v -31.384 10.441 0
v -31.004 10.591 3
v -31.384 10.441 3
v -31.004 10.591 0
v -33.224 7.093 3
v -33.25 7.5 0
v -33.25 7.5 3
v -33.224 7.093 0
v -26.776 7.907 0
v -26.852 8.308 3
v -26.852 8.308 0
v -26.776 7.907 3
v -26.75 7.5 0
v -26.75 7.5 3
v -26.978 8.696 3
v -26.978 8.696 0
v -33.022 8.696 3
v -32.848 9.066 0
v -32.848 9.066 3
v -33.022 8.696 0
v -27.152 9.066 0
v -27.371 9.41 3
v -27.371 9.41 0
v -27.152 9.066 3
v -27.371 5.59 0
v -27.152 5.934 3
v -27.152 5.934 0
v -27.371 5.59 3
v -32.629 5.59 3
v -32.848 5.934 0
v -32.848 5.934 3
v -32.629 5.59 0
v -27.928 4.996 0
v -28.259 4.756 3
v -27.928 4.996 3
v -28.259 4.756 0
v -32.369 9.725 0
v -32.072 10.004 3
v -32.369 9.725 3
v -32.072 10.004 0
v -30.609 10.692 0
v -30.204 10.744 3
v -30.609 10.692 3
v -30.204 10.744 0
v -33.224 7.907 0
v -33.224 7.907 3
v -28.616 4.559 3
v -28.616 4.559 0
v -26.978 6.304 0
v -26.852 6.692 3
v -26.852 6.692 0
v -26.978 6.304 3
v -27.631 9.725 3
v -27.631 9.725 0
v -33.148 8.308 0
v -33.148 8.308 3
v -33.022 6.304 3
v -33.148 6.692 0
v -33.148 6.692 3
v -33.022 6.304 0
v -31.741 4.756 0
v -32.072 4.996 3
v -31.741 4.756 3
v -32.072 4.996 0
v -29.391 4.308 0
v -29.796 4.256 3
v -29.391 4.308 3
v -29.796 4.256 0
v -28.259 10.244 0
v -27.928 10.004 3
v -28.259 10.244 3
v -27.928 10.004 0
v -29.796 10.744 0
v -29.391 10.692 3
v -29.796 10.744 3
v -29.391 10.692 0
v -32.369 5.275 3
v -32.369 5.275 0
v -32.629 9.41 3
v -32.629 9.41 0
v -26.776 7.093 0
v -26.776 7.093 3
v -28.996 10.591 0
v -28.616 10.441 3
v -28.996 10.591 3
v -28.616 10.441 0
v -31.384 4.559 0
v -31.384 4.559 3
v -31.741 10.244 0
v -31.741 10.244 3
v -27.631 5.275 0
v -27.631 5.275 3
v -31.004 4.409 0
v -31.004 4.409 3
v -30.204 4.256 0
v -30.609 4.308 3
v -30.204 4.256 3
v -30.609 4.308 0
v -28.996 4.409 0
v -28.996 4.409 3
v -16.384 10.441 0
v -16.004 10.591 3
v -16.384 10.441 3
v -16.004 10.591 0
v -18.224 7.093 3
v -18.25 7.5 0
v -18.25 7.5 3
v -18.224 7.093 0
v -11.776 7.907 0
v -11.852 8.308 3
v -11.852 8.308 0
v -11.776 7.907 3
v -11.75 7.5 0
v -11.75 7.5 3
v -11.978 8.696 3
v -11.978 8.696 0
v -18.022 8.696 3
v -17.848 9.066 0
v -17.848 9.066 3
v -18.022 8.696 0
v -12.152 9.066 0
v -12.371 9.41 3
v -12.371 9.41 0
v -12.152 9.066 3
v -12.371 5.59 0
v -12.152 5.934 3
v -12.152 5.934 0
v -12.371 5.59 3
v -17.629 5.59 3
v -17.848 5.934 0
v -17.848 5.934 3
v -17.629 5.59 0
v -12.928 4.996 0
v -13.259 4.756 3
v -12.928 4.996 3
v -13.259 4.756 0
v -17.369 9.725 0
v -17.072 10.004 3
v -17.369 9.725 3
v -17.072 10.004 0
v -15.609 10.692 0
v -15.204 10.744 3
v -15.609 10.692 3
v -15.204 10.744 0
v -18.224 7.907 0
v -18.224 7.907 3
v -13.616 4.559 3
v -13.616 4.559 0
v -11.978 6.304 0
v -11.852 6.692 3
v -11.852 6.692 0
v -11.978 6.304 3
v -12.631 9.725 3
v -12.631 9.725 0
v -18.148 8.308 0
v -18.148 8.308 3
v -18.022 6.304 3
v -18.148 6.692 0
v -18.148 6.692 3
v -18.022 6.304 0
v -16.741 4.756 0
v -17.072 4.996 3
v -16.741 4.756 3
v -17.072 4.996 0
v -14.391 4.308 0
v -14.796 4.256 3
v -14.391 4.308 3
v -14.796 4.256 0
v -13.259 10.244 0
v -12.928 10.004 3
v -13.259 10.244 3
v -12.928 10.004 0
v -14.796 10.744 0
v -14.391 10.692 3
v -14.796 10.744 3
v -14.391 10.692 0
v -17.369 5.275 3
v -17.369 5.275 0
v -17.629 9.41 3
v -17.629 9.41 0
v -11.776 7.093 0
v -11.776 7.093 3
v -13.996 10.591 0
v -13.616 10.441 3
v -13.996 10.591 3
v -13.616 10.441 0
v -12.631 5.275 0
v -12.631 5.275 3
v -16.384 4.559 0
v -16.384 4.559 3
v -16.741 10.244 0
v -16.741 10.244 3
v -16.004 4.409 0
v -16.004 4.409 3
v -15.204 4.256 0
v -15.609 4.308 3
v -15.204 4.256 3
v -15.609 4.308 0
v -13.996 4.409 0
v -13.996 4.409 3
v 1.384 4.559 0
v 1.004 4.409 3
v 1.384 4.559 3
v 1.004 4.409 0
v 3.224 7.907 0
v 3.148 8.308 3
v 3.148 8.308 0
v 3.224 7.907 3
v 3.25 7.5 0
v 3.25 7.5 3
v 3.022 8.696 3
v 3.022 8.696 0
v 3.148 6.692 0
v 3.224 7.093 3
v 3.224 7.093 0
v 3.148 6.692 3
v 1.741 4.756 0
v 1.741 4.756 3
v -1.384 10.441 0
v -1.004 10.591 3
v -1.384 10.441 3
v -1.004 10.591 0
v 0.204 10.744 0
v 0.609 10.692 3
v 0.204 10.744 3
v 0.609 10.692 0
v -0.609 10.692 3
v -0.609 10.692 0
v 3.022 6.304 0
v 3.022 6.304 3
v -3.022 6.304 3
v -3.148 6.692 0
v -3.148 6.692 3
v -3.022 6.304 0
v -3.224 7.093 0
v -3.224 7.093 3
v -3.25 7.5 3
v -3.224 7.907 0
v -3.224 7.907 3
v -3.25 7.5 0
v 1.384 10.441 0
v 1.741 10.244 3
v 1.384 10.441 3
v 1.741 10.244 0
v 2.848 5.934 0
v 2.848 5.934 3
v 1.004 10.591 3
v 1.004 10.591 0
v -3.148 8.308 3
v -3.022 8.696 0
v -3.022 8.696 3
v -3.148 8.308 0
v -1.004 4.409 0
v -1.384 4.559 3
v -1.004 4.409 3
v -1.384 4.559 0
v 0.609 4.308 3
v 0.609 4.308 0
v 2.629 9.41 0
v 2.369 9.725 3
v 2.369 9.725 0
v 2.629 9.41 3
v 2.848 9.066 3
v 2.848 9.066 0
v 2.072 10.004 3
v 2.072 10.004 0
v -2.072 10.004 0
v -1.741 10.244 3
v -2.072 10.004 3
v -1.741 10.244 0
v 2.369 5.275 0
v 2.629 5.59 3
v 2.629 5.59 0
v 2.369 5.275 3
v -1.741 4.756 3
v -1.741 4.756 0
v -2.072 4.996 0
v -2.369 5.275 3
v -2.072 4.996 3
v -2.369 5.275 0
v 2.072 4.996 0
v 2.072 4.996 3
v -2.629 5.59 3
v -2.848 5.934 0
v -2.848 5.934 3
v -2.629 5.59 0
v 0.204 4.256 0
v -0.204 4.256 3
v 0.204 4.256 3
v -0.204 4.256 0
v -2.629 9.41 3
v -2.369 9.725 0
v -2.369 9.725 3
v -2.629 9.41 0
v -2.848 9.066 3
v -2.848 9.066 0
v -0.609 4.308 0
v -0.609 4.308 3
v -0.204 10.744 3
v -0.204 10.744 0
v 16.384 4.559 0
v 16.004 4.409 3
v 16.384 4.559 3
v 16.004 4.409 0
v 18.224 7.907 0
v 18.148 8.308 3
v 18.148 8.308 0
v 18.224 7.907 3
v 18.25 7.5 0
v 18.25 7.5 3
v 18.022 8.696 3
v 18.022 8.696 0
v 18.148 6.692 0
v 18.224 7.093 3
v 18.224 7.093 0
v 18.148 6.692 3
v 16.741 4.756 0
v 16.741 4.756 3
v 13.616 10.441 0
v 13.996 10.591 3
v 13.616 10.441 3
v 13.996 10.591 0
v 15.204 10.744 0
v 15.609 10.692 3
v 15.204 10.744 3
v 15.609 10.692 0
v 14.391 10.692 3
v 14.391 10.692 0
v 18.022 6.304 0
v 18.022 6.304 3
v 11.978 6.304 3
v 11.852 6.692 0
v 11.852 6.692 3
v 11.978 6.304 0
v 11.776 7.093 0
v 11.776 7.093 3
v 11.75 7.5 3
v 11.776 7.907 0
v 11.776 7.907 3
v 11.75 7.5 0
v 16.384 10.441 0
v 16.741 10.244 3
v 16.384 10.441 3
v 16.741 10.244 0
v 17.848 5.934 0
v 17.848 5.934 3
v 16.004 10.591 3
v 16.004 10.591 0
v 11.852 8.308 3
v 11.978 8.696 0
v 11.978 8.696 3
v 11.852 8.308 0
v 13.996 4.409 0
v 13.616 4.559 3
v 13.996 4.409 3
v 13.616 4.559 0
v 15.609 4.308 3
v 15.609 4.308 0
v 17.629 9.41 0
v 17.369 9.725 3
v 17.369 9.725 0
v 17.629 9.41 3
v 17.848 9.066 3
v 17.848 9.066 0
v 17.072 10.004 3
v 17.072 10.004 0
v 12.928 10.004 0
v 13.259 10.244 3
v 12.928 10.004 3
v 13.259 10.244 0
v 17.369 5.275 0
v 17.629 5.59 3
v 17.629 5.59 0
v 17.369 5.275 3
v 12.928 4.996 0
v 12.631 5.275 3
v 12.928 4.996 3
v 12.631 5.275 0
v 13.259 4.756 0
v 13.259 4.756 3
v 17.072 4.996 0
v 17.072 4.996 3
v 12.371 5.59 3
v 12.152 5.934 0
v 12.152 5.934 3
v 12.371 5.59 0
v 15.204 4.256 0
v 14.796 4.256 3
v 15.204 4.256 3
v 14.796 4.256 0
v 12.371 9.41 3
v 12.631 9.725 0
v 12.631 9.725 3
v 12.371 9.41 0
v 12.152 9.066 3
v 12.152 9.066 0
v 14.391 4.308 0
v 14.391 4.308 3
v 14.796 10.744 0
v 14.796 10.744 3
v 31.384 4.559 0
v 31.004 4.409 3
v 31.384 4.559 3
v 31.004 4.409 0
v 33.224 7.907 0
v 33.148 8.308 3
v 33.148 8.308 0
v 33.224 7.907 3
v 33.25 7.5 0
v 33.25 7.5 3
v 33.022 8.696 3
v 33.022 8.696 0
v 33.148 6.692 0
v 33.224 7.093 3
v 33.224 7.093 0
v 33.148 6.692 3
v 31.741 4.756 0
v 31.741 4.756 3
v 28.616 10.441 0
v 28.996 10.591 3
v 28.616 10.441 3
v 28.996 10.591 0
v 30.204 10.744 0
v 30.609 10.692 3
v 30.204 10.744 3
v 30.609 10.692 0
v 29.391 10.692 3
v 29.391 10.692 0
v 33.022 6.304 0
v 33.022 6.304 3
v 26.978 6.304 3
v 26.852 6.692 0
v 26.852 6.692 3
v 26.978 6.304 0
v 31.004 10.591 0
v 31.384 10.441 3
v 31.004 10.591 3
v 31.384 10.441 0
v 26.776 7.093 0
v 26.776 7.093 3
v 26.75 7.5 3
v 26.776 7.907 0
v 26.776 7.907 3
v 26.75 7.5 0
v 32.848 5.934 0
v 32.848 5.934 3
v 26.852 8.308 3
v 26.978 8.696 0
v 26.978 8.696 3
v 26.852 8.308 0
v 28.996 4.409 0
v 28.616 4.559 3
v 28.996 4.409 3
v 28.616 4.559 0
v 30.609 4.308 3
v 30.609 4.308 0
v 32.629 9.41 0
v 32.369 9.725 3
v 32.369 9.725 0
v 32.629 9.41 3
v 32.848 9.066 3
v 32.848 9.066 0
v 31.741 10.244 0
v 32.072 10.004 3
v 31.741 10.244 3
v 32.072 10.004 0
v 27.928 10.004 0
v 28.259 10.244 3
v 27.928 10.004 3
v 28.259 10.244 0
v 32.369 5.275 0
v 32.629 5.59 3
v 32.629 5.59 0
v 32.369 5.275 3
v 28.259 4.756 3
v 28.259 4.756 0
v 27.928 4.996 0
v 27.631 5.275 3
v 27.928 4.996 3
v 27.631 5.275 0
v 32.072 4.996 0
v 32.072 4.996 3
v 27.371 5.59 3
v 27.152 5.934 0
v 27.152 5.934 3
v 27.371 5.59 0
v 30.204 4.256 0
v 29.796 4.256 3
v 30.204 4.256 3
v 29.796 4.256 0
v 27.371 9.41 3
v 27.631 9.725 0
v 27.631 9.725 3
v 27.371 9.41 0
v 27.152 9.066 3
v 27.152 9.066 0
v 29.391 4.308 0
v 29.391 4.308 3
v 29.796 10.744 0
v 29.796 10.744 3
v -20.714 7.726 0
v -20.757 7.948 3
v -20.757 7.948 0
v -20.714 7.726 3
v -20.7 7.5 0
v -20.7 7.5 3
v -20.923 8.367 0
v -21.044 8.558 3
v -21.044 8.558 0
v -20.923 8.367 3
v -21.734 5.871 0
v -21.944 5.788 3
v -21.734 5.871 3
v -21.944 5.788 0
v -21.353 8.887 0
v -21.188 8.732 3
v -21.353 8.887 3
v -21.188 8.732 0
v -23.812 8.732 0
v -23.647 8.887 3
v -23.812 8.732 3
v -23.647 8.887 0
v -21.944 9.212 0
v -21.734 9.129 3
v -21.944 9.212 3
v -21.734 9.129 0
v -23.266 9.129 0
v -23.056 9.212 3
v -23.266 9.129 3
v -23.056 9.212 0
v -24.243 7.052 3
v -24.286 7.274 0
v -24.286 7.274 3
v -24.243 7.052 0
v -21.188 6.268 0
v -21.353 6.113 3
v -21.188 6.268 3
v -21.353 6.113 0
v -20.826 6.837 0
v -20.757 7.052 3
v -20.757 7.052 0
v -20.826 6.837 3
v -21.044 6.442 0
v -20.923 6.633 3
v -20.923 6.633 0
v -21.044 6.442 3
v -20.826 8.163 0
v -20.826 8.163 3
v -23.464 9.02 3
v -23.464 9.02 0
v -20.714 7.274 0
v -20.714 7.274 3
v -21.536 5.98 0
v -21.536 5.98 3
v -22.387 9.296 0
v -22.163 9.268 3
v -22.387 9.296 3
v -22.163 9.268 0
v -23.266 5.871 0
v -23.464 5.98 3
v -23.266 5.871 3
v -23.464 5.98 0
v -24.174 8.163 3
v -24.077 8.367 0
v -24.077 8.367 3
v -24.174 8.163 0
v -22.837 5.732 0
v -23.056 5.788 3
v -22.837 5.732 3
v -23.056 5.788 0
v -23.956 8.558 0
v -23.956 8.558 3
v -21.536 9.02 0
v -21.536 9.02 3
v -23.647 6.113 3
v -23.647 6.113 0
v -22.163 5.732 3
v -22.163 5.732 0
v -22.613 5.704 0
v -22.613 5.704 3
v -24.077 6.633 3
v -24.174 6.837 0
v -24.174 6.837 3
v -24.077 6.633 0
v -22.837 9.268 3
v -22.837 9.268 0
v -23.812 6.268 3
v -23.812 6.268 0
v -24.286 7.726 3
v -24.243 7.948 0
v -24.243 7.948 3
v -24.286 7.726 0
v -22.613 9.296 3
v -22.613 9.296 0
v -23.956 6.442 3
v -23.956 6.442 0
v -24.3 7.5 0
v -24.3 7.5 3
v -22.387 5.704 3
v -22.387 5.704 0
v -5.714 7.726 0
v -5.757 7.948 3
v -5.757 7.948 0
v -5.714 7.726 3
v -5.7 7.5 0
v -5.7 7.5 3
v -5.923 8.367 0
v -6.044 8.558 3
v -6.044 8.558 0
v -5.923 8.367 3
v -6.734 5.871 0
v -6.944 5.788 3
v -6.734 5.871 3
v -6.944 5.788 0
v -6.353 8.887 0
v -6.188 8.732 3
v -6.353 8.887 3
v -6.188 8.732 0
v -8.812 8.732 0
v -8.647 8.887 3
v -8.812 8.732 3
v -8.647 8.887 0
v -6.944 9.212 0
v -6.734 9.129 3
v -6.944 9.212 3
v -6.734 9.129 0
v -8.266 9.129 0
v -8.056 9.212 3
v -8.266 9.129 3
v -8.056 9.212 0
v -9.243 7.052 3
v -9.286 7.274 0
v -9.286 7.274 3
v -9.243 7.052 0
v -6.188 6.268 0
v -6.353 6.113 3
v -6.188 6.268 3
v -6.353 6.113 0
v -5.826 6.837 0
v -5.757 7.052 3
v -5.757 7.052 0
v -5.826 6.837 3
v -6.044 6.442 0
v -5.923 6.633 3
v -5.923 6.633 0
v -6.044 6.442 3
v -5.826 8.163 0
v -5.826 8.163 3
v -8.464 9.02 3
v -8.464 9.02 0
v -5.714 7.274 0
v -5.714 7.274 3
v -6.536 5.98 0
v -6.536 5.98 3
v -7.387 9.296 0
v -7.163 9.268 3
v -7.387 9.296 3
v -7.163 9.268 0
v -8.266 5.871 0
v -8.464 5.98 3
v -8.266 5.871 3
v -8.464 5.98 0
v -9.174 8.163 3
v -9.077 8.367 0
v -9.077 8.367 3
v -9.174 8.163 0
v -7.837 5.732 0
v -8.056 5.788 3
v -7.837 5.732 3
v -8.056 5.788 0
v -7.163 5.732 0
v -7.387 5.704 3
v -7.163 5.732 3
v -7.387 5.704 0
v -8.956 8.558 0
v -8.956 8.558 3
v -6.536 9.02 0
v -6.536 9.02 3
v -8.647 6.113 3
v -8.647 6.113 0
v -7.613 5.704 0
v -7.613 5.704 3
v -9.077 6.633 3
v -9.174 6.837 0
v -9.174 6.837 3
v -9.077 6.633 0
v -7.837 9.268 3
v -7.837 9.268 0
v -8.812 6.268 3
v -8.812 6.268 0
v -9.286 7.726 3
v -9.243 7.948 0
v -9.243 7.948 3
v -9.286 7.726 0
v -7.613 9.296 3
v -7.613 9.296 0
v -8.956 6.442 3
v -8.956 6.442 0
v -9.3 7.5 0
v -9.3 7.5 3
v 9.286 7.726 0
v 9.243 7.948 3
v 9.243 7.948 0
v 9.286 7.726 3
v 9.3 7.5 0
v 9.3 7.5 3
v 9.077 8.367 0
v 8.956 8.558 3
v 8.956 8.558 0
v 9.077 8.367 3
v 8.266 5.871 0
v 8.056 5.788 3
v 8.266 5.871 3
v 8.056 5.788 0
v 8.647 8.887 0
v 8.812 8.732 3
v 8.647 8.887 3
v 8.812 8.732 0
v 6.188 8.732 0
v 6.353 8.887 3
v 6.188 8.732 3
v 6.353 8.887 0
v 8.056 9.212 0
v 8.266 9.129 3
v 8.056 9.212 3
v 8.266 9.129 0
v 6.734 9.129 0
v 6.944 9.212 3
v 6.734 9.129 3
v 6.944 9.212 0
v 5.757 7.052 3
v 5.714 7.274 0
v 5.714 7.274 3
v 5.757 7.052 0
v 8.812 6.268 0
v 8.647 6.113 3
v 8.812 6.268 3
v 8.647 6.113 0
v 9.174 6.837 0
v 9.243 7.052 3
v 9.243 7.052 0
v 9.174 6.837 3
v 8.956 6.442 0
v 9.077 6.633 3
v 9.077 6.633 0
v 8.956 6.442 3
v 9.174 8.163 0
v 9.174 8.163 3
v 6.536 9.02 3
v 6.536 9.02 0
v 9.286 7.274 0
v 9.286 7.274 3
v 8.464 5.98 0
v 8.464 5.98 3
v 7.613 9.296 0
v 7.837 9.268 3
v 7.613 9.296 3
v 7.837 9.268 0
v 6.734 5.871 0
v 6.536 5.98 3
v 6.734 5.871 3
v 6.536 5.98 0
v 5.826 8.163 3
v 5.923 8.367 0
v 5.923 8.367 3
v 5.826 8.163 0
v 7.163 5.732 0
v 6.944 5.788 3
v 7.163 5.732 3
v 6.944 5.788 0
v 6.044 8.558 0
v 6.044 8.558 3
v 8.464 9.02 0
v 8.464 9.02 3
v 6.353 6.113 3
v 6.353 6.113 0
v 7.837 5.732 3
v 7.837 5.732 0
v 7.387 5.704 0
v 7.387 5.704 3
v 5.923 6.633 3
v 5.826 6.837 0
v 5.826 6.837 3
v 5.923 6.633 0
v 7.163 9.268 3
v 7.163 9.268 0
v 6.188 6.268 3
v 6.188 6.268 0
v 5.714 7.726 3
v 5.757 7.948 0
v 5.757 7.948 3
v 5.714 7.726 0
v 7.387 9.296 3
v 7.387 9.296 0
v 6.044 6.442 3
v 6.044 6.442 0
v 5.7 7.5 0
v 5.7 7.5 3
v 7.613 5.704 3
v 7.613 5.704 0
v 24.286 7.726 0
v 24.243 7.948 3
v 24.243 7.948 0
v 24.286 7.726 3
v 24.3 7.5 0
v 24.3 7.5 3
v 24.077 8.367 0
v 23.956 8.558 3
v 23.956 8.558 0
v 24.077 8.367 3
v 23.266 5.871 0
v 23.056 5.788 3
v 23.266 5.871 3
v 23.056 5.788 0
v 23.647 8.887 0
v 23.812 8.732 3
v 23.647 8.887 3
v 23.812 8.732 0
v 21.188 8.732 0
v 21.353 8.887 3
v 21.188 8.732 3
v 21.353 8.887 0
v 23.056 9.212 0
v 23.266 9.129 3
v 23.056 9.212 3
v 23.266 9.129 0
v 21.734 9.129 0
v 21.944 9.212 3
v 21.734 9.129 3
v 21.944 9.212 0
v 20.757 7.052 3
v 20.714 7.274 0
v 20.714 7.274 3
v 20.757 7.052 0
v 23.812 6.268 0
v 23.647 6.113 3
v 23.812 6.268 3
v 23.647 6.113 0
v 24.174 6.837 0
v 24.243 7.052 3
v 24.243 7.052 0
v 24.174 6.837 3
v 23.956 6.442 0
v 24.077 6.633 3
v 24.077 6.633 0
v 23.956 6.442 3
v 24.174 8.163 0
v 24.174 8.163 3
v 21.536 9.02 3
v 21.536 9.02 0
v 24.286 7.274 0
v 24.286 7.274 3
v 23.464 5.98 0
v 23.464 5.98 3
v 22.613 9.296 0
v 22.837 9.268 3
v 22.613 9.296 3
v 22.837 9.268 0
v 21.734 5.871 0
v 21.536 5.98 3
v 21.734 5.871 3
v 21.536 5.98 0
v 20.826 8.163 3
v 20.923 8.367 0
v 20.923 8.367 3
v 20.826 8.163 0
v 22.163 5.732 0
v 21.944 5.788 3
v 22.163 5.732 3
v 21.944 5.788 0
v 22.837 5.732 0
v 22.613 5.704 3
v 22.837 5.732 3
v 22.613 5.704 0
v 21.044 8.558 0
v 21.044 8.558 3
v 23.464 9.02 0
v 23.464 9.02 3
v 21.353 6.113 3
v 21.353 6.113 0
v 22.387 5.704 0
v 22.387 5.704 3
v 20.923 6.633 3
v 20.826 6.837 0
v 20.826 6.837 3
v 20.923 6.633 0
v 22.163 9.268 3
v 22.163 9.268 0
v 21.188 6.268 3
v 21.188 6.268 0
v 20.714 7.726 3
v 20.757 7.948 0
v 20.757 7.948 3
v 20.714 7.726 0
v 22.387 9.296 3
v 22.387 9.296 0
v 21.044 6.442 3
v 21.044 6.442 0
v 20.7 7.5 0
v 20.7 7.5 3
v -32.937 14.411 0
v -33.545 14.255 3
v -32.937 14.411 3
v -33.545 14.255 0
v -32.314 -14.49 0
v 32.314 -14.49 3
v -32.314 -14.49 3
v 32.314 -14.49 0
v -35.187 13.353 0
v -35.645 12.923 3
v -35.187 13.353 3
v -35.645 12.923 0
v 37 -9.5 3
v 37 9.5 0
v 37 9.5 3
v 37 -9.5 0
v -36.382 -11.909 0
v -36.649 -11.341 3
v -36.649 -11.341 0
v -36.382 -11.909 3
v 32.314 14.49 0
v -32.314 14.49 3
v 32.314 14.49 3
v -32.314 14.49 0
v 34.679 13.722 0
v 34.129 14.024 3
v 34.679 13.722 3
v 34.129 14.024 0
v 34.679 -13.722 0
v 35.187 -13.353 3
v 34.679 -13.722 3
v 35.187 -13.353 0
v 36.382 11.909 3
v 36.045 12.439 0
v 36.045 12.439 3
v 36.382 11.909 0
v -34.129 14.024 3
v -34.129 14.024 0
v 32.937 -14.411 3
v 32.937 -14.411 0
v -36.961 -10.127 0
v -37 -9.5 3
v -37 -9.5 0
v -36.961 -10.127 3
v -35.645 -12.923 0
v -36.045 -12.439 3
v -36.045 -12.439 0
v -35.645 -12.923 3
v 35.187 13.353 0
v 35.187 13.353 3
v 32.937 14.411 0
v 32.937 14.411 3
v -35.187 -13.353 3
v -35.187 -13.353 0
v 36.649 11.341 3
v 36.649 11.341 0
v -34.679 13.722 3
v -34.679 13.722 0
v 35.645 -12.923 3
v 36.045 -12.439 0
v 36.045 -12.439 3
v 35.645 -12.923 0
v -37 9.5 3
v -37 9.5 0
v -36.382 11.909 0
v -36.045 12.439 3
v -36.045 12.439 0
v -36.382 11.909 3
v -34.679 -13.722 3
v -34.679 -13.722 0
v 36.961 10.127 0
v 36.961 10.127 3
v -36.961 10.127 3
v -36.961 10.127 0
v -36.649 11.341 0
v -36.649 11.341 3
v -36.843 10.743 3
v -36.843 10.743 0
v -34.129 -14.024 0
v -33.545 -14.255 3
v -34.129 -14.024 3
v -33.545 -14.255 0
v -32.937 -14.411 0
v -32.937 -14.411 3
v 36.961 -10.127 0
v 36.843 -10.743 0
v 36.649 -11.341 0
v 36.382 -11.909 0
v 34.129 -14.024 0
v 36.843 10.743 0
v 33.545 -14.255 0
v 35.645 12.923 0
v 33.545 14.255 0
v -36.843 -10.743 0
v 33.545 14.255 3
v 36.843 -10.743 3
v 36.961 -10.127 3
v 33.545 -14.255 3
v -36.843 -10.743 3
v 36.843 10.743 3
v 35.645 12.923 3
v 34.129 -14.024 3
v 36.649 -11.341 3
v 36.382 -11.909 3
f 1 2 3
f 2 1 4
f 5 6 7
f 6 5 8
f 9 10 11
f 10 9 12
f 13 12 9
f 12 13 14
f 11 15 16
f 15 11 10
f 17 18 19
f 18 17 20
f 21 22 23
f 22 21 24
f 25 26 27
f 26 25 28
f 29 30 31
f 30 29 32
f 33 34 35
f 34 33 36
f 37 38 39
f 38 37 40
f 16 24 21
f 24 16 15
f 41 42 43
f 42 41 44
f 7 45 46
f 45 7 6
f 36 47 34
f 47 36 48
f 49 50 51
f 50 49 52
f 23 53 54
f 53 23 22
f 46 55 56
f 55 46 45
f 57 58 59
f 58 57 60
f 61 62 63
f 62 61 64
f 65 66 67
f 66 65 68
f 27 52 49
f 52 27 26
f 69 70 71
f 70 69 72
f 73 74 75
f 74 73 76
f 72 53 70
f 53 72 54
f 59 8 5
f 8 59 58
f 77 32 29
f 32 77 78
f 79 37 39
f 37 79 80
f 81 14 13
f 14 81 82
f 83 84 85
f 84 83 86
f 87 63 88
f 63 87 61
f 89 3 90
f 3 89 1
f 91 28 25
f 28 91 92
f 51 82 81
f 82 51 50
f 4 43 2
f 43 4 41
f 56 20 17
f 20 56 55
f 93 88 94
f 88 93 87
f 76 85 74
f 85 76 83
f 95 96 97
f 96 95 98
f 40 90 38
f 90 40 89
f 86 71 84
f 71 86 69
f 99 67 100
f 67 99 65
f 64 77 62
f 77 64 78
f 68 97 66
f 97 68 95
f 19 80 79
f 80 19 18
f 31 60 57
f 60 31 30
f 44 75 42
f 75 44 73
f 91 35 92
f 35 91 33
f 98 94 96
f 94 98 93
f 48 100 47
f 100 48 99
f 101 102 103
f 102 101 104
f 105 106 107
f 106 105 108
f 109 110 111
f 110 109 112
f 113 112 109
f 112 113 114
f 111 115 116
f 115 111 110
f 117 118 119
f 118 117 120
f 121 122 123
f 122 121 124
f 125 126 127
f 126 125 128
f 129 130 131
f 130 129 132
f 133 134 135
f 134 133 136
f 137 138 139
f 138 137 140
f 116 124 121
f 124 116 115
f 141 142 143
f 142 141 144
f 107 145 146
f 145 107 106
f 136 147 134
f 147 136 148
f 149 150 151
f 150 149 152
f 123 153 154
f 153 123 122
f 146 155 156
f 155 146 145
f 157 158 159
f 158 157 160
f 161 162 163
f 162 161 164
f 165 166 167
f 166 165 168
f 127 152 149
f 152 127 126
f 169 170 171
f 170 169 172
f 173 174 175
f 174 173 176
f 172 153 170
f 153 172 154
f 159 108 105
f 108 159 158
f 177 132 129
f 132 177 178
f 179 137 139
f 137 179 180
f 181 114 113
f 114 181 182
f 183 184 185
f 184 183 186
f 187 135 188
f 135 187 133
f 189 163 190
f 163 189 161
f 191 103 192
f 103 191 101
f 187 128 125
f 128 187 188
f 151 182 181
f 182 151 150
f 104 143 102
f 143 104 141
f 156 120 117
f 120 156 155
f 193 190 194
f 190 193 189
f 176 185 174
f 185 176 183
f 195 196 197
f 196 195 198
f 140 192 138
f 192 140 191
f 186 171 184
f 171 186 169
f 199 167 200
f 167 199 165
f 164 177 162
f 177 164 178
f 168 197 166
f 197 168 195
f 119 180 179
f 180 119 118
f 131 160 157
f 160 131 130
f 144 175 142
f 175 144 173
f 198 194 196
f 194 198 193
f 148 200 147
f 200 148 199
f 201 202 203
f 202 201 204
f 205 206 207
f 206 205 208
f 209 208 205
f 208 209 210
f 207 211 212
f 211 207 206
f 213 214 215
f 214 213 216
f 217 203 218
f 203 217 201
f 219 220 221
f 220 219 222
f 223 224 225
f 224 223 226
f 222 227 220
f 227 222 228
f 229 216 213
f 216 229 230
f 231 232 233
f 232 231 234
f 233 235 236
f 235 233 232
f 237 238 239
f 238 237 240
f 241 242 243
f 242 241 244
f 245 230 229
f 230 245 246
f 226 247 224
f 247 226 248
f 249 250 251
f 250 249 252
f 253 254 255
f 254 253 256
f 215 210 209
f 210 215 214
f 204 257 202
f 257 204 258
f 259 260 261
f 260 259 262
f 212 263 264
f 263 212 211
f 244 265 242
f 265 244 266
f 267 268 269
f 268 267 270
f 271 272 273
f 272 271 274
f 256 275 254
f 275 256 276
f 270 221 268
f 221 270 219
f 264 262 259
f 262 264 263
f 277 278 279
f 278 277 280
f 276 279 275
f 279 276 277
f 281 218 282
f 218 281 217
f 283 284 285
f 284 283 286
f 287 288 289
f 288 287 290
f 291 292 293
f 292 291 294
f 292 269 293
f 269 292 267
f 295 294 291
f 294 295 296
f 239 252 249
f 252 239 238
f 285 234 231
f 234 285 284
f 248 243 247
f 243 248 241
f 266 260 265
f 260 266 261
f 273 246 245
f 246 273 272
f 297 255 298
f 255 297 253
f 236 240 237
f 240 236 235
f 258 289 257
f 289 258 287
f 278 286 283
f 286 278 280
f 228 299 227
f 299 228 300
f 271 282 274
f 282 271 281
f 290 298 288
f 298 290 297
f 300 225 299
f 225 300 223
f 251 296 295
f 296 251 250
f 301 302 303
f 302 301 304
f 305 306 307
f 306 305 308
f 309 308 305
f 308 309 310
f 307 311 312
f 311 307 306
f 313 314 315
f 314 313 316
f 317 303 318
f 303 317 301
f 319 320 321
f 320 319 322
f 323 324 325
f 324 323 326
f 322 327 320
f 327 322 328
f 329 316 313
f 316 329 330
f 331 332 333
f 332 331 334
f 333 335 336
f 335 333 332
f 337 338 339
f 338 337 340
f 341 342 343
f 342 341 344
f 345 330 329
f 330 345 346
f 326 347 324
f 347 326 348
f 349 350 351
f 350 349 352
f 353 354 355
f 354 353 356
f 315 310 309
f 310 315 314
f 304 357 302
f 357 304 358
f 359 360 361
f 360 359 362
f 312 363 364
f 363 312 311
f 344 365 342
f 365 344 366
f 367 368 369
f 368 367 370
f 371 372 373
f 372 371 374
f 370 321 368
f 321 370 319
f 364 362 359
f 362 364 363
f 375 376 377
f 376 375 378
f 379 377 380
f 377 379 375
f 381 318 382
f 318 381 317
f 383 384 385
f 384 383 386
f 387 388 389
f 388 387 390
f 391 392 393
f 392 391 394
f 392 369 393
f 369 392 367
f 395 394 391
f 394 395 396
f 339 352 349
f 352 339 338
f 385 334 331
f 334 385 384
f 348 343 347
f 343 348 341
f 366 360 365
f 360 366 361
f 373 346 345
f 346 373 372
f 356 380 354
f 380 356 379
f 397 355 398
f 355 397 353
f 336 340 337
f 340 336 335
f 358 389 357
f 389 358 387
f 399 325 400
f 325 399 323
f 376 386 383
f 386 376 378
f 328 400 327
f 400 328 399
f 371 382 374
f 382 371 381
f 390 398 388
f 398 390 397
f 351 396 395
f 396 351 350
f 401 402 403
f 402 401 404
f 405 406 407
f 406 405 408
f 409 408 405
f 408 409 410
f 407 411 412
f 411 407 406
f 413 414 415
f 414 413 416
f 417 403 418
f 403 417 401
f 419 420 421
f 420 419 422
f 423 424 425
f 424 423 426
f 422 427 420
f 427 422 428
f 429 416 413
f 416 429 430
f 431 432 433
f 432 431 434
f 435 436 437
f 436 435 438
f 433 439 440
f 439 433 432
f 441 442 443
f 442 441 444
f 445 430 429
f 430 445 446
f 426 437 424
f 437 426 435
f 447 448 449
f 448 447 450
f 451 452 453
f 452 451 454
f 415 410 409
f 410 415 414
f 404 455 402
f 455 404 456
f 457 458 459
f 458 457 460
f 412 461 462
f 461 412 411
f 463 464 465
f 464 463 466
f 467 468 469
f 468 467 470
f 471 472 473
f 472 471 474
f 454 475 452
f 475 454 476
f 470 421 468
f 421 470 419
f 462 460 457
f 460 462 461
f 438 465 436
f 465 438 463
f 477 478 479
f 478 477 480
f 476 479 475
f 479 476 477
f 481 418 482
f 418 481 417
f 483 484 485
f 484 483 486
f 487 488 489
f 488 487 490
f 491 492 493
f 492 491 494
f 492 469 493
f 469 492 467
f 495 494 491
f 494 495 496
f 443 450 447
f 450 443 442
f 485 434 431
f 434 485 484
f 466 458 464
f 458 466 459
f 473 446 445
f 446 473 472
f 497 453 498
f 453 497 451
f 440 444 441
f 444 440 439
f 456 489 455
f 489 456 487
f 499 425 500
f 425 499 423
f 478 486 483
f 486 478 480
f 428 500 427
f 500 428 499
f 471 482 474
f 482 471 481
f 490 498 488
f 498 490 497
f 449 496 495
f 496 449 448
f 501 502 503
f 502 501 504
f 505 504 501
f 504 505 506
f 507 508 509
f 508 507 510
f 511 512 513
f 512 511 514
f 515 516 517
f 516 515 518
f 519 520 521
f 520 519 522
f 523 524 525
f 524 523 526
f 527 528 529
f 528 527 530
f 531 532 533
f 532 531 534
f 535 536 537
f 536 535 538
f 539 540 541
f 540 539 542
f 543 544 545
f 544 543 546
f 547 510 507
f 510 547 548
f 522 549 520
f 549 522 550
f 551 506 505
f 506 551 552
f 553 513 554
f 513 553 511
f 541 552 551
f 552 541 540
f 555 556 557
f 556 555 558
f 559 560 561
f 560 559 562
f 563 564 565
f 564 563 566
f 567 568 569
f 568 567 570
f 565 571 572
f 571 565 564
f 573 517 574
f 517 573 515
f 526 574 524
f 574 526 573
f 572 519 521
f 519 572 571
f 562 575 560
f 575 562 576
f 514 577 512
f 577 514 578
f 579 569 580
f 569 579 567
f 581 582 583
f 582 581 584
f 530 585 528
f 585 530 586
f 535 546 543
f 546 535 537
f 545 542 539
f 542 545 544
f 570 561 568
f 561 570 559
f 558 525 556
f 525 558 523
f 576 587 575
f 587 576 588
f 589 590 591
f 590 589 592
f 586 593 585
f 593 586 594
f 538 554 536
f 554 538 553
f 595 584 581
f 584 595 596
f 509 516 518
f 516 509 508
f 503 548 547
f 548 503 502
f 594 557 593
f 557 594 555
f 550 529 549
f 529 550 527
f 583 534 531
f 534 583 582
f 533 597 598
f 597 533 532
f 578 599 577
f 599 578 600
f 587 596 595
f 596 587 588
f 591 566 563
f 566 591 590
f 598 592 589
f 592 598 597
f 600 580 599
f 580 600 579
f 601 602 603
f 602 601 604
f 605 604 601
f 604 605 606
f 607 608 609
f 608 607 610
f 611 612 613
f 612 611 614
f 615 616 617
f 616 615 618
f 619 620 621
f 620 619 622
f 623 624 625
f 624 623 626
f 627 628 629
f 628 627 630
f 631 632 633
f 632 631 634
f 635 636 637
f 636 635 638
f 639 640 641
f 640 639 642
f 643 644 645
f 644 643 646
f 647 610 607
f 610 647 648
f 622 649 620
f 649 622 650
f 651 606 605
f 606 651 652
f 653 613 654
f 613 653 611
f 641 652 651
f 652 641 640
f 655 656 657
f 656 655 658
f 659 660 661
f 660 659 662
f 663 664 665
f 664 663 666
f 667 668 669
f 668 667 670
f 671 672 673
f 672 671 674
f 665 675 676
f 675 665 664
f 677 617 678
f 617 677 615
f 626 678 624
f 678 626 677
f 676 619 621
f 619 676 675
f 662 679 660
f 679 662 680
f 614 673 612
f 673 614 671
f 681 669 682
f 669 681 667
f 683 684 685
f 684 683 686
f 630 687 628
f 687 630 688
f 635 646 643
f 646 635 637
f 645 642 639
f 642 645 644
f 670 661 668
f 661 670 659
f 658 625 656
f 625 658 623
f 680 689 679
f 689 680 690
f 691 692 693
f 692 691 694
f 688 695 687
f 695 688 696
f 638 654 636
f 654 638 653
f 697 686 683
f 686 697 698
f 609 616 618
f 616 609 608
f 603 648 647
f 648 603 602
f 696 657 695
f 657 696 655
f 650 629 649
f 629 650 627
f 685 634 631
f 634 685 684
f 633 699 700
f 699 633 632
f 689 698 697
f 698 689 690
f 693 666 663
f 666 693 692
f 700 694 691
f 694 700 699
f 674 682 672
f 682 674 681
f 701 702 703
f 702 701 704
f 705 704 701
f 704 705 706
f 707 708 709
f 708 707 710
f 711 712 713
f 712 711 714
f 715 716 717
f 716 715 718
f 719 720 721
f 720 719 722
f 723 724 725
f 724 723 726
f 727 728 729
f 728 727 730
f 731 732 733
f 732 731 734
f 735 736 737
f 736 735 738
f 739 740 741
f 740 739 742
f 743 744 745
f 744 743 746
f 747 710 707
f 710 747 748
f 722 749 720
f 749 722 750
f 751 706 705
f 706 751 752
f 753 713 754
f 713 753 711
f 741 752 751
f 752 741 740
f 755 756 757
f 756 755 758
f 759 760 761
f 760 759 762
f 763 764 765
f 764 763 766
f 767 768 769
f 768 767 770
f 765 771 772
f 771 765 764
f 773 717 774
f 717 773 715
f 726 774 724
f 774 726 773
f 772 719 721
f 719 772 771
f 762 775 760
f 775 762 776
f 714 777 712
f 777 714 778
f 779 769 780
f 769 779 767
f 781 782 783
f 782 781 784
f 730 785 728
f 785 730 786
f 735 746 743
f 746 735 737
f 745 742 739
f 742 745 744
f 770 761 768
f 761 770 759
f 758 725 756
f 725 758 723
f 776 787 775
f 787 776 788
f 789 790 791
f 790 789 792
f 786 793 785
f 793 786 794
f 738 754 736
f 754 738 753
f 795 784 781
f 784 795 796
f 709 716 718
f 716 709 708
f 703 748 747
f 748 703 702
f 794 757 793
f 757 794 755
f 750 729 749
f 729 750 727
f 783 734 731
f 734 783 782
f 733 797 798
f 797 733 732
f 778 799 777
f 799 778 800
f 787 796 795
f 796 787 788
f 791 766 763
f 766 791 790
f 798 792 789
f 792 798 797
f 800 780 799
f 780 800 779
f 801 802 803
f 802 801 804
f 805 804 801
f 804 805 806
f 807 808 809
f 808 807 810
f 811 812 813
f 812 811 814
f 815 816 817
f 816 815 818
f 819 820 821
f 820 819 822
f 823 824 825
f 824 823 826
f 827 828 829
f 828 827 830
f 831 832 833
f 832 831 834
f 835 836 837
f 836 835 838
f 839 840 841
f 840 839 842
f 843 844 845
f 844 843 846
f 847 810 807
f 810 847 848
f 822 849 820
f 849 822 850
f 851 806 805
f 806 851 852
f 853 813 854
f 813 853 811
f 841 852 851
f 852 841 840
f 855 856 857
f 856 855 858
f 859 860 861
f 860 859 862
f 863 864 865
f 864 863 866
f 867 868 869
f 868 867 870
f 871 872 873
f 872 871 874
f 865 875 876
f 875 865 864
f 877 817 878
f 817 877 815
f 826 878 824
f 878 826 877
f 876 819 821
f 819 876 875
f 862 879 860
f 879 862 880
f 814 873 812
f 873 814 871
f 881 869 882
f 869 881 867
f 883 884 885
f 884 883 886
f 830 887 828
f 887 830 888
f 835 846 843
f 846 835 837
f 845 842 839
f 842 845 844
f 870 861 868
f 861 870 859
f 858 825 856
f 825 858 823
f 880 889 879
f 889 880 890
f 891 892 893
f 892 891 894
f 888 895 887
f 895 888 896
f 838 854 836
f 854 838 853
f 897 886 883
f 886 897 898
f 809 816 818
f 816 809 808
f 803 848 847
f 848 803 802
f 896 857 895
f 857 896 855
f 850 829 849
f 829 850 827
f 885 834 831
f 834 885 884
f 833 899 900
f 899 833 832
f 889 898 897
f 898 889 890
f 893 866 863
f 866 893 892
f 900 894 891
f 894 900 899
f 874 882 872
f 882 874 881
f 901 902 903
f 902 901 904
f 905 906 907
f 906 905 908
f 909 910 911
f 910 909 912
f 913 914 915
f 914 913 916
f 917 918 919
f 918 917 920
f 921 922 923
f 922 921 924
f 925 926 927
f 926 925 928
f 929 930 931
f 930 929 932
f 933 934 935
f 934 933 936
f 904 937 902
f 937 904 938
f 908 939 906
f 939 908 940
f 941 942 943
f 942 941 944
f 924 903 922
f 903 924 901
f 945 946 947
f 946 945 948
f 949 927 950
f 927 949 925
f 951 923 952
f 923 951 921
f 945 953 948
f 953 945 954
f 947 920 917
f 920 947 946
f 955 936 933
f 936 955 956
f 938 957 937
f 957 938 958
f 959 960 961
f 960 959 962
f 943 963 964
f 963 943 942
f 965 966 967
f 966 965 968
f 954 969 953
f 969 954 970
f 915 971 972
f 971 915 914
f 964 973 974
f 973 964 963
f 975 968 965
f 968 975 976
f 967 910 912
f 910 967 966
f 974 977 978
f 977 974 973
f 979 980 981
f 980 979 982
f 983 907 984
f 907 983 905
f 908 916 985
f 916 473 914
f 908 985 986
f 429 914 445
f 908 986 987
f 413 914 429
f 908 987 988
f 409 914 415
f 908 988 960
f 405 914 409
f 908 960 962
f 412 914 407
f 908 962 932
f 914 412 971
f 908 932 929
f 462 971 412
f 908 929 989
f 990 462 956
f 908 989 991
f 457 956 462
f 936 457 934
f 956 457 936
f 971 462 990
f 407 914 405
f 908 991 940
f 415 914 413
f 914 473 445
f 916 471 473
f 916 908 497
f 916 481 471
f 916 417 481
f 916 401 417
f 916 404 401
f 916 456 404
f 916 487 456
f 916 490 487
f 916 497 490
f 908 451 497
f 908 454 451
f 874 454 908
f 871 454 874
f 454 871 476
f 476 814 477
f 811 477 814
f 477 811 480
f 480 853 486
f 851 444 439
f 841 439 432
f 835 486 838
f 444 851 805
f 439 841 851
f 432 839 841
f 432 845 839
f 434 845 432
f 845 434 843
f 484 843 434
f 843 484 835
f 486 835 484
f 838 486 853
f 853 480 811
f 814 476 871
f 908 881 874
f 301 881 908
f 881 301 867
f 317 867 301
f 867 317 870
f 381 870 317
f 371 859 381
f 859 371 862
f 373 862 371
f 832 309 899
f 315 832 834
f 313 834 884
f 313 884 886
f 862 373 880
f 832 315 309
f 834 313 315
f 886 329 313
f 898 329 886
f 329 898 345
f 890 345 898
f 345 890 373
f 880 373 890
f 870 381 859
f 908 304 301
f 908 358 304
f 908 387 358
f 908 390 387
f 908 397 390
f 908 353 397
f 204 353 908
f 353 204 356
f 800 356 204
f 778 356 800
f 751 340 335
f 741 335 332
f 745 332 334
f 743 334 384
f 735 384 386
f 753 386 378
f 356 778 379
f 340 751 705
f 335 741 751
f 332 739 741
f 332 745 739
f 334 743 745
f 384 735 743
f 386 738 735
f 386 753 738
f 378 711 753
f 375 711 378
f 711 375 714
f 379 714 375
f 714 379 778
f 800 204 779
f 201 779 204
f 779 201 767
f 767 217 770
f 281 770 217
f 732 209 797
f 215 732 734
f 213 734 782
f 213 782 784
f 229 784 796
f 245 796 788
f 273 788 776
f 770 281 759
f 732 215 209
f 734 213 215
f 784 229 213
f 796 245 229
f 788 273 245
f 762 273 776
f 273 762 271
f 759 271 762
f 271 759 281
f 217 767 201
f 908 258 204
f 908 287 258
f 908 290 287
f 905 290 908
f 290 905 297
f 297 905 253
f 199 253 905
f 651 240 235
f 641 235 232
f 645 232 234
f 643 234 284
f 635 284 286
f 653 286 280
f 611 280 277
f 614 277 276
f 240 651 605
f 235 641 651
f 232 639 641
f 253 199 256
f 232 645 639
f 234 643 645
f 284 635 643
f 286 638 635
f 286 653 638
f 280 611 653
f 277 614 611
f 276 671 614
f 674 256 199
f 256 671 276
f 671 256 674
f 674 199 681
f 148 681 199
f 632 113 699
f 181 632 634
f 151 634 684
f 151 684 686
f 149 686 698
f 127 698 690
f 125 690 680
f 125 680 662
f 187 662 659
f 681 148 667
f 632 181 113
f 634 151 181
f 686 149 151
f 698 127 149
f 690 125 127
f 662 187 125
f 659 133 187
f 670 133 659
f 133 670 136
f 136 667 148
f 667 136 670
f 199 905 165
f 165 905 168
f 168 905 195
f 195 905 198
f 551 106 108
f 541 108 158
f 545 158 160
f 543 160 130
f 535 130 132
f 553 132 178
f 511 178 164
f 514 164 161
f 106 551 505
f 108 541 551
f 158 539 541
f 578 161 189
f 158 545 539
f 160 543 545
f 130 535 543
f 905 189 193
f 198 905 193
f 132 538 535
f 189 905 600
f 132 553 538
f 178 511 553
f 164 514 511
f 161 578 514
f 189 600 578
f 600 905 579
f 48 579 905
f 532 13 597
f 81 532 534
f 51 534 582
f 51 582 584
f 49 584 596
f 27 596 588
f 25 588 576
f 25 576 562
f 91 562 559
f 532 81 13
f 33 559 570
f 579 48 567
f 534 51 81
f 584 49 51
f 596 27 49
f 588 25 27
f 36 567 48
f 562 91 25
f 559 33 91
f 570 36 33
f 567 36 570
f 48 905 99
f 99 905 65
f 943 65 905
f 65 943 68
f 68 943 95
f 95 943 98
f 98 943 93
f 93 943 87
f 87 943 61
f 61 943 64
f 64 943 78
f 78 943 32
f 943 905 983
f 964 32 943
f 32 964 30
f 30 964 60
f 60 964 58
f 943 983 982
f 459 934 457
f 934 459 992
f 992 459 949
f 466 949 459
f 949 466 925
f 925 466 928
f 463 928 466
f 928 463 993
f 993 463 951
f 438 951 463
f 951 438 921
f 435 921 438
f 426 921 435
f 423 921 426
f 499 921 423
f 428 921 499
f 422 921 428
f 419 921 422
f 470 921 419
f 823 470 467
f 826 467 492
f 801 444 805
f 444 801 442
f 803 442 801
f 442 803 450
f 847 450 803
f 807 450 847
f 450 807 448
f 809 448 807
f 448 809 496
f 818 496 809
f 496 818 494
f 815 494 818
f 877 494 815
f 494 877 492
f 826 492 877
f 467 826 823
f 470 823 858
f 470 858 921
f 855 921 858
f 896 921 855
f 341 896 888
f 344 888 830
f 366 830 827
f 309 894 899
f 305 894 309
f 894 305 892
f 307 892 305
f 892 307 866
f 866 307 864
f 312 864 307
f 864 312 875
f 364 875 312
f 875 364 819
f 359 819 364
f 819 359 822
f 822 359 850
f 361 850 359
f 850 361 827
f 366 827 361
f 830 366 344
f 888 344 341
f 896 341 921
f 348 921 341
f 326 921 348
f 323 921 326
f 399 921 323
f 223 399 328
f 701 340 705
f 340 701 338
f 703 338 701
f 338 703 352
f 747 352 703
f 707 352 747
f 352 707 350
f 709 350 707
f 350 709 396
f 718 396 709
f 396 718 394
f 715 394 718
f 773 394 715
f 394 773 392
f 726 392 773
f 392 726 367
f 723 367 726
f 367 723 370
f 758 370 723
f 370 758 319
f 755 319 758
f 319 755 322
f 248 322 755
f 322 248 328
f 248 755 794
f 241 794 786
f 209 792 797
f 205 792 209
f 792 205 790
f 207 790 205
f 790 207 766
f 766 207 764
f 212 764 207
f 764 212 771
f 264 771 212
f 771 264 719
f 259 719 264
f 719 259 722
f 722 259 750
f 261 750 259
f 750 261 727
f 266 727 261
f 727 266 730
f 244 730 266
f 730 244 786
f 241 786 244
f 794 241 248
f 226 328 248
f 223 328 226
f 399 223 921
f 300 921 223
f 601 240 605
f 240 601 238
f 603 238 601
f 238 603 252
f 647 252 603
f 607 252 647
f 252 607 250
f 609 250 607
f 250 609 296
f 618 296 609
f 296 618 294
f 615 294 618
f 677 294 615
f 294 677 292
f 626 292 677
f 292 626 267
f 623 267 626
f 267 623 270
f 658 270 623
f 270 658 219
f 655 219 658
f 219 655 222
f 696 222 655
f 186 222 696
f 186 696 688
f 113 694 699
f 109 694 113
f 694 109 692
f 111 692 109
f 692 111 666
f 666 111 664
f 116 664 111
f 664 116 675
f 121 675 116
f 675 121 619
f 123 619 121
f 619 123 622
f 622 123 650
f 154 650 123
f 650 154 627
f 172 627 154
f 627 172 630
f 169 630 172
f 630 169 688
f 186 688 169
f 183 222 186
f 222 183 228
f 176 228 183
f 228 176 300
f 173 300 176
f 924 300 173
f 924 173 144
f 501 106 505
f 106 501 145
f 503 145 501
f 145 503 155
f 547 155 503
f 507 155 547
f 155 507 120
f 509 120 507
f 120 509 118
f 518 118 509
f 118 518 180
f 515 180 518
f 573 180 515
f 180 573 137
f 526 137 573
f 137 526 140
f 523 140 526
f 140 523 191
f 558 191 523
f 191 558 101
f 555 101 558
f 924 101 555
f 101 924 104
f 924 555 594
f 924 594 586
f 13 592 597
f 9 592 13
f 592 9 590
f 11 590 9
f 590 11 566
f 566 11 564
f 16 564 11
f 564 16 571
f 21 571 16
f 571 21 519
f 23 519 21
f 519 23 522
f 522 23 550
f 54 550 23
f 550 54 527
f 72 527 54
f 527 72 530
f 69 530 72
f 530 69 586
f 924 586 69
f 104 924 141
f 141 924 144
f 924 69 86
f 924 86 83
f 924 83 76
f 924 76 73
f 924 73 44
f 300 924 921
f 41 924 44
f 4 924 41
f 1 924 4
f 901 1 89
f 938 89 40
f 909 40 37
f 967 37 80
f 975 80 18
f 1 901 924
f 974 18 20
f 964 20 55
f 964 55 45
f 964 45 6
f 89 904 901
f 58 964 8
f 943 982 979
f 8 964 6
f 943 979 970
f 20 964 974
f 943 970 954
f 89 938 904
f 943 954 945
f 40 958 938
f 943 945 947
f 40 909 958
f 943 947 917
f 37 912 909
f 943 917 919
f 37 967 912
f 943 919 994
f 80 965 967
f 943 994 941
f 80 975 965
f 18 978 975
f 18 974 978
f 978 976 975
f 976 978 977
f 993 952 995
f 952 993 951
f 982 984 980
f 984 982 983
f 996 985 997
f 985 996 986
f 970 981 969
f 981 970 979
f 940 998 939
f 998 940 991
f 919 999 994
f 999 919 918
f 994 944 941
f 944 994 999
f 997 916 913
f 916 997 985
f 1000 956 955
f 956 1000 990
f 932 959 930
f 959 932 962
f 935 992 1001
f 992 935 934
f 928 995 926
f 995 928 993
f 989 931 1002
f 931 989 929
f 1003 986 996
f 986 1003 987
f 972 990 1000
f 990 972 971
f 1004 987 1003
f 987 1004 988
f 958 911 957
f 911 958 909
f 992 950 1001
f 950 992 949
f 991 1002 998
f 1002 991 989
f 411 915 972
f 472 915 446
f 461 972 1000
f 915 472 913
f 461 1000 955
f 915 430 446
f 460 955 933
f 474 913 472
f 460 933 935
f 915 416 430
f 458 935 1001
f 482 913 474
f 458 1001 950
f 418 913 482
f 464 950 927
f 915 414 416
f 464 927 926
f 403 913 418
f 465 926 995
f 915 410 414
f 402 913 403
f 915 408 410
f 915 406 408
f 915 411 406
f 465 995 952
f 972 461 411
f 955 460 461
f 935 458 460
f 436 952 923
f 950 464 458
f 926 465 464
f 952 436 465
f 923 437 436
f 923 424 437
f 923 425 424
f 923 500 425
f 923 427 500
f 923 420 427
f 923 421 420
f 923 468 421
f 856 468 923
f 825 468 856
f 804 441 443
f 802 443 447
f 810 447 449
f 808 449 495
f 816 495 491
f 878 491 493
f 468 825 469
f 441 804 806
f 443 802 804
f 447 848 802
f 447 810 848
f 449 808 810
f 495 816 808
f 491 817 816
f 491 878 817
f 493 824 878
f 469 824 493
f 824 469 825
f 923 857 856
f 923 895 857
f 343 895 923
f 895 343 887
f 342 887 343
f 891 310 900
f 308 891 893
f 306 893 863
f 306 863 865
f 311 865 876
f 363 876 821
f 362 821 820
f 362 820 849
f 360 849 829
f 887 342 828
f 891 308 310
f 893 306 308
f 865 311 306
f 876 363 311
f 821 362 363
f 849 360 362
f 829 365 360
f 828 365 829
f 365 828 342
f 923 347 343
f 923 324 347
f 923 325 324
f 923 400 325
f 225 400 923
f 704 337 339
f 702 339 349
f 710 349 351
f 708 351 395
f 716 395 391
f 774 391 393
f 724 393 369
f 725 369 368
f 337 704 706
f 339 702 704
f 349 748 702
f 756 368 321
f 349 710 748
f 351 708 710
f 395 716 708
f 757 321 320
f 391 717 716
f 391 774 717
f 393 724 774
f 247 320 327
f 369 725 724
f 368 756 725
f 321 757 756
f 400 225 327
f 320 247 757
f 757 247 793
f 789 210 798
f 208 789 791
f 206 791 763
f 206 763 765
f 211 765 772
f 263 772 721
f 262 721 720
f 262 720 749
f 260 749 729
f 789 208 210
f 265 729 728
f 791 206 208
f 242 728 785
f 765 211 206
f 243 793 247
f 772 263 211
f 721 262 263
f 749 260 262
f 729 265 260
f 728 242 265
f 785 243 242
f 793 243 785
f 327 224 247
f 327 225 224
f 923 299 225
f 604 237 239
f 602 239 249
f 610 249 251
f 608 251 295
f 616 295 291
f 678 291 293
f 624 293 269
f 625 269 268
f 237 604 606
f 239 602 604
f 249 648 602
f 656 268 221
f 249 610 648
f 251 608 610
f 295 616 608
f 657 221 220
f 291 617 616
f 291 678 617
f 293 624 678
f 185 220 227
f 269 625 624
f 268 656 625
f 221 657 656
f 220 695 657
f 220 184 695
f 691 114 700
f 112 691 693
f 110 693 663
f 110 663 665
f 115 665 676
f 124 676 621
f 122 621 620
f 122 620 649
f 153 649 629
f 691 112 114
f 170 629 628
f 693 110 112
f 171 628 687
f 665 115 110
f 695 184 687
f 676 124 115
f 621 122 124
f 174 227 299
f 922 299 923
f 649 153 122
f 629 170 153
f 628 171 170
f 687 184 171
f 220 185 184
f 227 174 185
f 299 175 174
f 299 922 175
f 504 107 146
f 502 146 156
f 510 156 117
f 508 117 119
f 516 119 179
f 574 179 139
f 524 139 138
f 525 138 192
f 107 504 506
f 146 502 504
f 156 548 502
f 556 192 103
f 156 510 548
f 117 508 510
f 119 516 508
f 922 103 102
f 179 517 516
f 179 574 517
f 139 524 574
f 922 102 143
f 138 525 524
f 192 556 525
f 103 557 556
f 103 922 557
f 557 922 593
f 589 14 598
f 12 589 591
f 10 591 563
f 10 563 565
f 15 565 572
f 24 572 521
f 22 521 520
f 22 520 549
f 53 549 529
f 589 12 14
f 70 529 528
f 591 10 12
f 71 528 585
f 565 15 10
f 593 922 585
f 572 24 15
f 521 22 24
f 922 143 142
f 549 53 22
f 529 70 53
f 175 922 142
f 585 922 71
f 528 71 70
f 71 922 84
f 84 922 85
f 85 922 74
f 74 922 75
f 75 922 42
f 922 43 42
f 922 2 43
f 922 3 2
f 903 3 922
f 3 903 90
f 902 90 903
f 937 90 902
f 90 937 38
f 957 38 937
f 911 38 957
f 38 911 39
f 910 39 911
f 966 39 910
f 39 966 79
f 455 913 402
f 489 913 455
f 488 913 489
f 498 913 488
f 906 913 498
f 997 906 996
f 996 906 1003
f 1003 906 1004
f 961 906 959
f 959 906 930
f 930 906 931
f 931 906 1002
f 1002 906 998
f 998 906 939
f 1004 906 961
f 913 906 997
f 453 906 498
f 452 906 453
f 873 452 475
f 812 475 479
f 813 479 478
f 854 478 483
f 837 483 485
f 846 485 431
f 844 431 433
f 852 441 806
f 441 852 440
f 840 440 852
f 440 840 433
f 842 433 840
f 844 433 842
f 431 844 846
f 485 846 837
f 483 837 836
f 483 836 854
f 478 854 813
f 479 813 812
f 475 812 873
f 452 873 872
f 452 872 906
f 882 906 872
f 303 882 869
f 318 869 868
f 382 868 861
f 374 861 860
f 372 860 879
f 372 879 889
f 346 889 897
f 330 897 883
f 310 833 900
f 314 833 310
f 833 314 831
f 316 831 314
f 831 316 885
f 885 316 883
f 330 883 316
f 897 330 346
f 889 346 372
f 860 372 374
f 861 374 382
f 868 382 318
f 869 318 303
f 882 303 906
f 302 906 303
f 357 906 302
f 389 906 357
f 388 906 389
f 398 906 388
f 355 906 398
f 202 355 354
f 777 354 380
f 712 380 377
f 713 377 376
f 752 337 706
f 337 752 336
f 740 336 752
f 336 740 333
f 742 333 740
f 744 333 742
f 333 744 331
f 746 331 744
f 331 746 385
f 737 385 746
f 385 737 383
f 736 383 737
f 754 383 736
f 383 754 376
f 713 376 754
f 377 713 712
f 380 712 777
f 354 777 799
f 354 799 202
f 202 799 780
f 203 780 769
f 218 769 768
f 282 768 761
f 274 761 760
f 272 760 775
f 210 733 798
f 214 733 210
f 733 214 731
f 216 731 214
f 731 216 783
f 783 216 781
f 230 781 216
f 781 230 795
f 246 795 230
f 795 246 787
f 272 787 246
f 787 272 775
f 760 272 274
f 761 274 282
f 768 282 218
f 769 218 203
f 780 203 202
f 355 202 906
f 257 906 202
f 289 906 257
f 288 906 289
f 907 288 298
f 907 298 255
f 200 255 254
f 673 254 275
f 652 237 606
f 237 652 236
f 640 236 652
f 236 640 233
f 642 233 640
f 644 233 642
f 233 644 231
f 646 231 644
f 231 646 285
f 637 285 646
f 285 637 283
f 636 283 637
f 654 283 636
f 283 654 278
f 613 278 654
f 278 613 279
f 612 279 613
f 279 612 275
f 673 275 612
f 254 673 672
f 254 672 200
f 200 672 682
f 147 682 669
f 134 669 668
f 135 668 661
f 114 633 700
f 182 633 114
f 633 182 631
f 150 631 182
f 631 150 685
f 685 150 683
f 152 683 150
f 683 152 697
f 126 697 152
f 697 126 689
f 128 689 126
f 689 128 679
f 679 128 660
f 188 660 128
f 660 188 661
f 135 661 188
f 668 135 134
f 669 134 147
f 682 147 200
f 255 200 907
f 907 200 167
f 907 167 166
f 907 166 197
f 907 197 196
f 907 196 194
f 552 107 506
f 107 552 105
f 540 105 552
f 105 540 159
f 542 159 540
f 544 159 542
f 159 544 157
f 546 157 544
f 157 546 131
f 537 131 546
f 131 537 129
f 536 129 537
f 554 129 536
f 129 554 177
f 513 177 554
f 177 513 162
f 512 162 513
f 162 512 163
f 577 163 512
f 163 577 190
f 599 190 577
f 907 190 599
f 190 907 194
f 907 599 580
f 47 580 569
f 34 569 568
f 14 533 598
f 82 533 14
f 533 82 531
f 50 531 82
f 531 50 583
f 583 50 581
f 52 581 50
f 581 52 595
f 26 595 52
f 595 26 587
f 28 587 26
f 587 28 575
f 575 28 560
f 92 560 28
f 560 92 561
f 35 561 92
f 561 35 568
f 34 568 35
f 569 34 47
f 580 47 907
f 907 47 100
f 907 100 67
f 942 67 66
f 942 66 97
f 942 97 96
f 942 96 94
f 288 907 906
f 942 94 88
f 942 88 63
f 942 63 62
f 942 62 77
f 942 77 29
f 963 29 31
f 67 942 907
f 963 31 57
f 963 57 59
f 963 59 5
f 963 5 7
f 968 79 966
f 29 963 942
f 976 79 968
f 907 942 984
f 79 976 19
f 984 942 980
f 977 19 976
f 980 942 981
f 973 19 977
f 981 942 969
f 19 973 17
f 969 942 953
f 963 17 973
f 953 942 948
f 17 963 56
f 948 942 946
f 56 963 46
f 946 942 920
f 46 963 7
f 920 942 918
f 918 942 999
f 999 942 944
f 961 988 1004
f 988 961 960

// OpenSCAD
$fn = 50;


difference() {
	union() {
		*color(alpha = 1.0000000000, c = "gray") {
			translate(v = [0, 7, 0]) {
				linear_extrude(height = 1) {
					text(font = "Arial:style=Bold", halign = "center", size = 4.5000000000, text = "COMMENT plate main", valign = "center");
				}
			}
		}
		hull() {
			translate(v = [-32.0000000000, 9.5000000000, 0]) {
				cylinder(h = 3, r = 5);
			}
			translate(v = [32.0000000000, 9.5000000000, 0]) {
				cylinder(h = 3, r = 5);
			}
			translate(v = [-32.0000000000, -9.5000000000, 0]) {
				cylinder(h = 3, r = 5);
			}
			translate(v = [32.0000000000, -9.5000000000, 0]) {
				cylinder(h = 3, r = 5);
			}
		}
	}
	union() {
		*color(alpha = 1.0000000000, c = "gray") {
			translate(v = [0, 7, 0]) {
				linear_extrude(height = 1) {
					text(font = "Arial:style=Bold", halign = "center", size = 4.5000000000, text = "COMMENT holes main", valign = "center");
				}
			}
		}
		translate(v = [-30.0000000000, 7.5000000000, -100.0000000000]) {
			cylinder(h = 200, r = 3.2500000000);
		}
		translate(v = [-15.0000000000, 7.5000000000, -100.0000000000]) {
			cylinder(h = 200, r = 3.2500000000);
		}
		translate(v = [0.0000000000, 7.5000000000, -100.0000000000]) {
			cylinder(h = 200, r = 3.2500000000);
		}
		translate(v = [15.0000000000, 7.5000000000, -100.0000000000]) {
			cylinder(h = 200, r = 3.2500000000);
		}
		translate(v = [30.0000000000, 7.5000000000, -100.0000000000]) {
			cylinder(h = 200, r = 3.2500000000);
		}
		translate(v = [-30.0000000000, 7.5000000000, -100.0000000000]) {
			cylinder(h = 200, r = 1.8000000000);
		}
		translate(v = [-22.5000000000, 7.5000000000, -100.0000000000]) {
			cylinder(h = 200, r = 1.8000000000);
		}
		translate(v = [-15.0000000000, 7.5000000000, -100.0000000000]) {
			cylinder(h = 200, r = 1.8000000000);
		}
		translate(v = [-7.5000000000, 7.5000000000, -100.0000000000]) {
			cylinder(h = 200, r = 1.8000000000);
		}
		translate(v = [0.0000000000, 7.5000000000, -100.0000000000]) {
			cylinder(h = 200, r = 1.8000000000);
		}
		translate(v = [7.5000000000, 7.5000000000, -100.0000000000]) {
			cylinder(h = 200, r = 1.8000000000);
		}
		translate(v = [15.0000000000, 7.5000000000, -100.0000000000]) {
			cylinder(h = 200, r = 1.8000000000);
		}
		translate(v = [22.5000000000, 7.5000000000, -100.0000000000]) {
			cylinder(h = 200, r = 1.8000000000);
		}
		translate(v = [30.0000000000, 7.5000000000, -100.0000000000]) {
			cylinder(h = 200, r = 1.8000000000);
		}
		translate(v = [-30.0000000000, 7.5000000000, -100.0000000000]) {
			cylinder(h = 200, r = 1.8000000000);
		}
		translate(v = [-22.5000000000, 7.5000000000, -100.0000000000]) {
			cylinder(h = 200, r = 1.8000000000);
		}
		translate(v = [-15.0000000000, 7.5000000000, -100.0000000000]) {
			cylinder(h = 200, r = 1.8000000000);
		}
		translate(v = [-7.5000000000, 7.5000000000, -100.0000000000]) {
			cylinder(h = 200, r = 1.8000000000);
		}
		translate(v = [0.0000000000, 7.5000000000, -100.0000000000]) {
			cylinder(h = 200, r = 1.8000000000);
		}
		translate(v = [7.5000000000, 7.5000000000, -100.0000000000]) {
			cylinder(h = 200, r = 1.8000000000);
		}
		translate(v = [15.0000000000, 7.5000000000, -100.0000000000]) {
			cylinder(h = 200, r = 1.8000000000);
		}
		translate(v = [22.5000000000, 7.5000000000, -100.0000000000]) {
			cylinder(h = 200, r = 1.8000000000);
		}
		translate(v = [30.0000000000, 7.5000000000, -100.0000000000]) {
			cylinder(h = 200, r = 1.8000000000);
		}
		translate(v = [-30.0000000000, 7.5000000000, -100.0000000000]) {
			cylinder(h = 200, r = 1.8000000000);
		}
		translate(v = [-22.5000000000, 7.5000000000, -100.0000000000]) {
			cylinder(h = 200, r = 1.8000000000);
		}
		translate(v = [-15.0000000000, 7.5000000000, -100.0000000000]) {
			cylinder(h = 200, r = 1.8000000000);
		}
		translate(v = [-7.5000000000, 7.5000000000, -100.0000000000]) {
			cylinder(h = 200, r = 1.8000000000);
		}
		translate(v = [0.0000000000, 7.5000000000, -100.0000000000]) {
			cylinder(h = 200, r = 1.8000000000);
		}
		translate(v = [7.5000000000, 7.5000000000, -100.0000000000]) {
			cylinder(h = 200, r = 1.8000000000);
		}
		translate(v = [15.0000000000, 7.5000000000, -100.0000000000]) {
			cylinder(h = 200, r = 1.8000000000);
		}
		translate(v = [22.5000000000, 7.5000000000, -100.0000000000]) {
			cylinder(h = 200, r = 1.8000000000);
		}
		translate(v = [30.0000000000, 7.5000000000, -100.0000000000]) {
			cylinder(h = 200, r = 1.8000000000);
		}
	}
}
